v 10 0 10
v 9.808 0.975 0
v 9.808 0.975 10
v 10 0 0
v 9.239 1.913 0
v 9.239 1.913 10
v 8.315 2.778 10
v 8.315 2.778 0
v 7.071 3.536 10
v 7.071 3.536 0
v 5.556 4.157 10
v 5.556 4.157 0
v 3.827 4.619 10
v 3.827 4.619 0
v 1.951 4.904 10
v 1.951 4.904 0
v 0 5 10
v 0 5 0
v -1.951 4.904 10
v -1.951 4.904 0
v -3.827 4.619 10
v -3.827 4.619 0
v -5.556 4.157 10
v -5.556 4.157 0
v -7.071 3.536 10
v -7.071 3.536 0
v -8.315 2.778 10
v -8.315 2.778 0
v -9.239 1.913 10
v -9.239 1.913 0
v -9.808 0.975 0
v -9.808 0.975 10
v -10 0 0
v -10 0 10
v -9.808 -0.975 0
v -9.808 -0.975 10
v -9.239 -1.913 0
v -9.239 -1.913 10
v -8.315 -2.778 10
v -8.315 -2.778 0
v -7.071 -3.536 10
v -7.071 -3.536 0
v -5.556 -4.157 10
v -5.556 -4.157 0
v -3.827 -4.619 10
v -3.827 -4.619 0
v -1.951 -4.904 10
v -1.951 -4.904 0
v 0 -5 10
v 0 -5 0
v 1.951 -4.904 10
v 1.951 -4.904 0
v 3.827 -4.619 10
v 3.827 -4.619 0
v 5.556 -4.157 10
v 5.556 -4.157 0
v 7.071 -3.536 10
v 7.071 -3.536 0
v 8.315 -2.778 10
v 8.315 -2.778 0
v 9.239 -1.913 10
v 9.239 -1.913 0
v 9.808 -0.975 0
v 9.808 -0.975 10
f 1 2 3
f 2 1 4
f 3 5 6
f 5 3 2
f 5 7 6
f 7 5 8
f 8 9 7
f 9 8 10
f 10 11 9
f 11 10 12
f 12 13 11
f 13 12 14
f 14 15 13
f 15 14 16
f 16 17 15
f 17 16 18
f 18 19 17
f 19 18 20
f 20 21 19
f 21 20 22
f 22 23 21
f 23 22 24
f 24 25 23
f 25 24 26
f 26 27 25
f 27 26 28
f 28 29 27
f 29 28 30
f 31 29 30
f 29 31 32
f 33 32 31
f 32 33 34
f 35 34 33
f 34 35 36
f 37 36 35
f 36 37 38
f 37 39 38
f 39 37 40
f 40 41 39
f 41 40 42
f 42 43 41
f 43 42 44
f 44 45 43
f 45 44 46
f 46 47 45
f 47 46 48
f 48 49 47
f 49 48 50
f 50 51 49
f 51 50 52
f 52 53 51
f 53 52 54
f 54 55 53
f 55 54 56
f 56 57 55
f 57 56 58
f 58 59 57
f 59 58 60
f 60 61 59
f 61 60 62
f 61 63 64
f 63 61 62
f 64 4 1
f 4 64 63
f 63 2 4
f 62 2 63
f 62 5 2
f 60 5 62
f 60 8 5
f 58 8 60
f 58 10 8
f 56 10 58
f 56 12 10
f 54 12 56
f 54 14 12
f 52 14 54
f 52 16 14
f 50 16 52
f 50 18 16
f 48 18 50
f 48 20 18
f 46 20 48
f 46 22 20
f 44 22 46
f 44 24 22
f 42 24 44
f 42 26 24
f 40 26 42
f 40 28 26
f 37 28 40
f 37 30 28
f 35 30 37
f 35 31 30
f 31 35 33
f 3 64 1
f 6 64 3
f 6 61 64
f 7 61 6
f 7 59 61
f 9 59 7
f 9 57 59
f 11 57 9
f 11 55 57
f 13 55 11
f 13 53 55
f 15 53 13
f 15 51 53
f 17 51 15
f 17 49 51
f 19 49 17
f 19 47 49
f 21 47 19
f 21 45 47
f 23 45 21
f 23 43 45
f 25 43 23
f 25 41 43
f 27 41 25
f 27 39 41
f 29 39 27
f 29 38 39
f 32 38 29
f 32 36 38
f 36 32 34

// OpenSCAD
// A cylinder under an uneven scale: an elliptic cylinder, declared and written.
//
// A circular cylinder under any affine map that is not a similarity is the
// elliptic cylinder through the image of its circle - the images of its axis and
// of two perpendicular radii are the sweep and two conjugate semi-diameters of a
// section. Until 2026-09-25 the record was dropped instead (Surface::transform
// had nothing to become), and so were the planes of both caps, though a plane
// stays a plane under every affine map. Now the cylinder becomes an
// EllipticCylinderSurface (Surface::transformed), the planes move with the map,
// and the wall is written as the SURFACE_OF_LINEAR_EXTRUSION of its ELLIPSE.
//
// Declared, from the model: the elliptic cylinder of semi-axes 10 and 5, and the
// two cap planes.
// EXPECT: 1 analytic surface available (0 cylindrical, 0 spherical, 0 toroidal, 0 Bezier, 1 elliptic), and 2 declared planes
//
// Every wall facet is on it at machine precision - the scale moves each vertex
// onto the image of the circle it was on - so every one is decided by the model.
// EXPECT: what decided each written facet: 32 D0, 0 D1, 0 D2, 0 D3, 0 D4
// And the rims are the planes' sections of it, ellipses, written as such - each
// on the plane its cap facets are named for, not one their corners happen to
// lie on (open item 39, R13).
// EXPECT: on a plane the model declared (2 named for it, 0 on it by position alone, which derives the plane - D1), 0 on one taken from the mesh
//
// And the wall is one face. It goes all the way round between its two rims, so
// it is closed by a seam along a ruling, as a band is, and each rim is one whole
// ELLIPSE from the seam back to it - two plane sections, and the one seam line.
// EXPECT: 2 plane sections written as the conic it is - 2 on a plane the model declared
// EXPECT: 1 face round its axis between two rims closed by a seam along a ruling
// ROUNDTRIP: Plane=2 SurfaceOfExtrusion=1
// EDGES: Ellipse=2 Line=1
//
// Derived: pi a b h = pi * 10 * 5 * 10.
// VOLUME: 1570.7963268
$fn = 32;
scale([2, 1, 1]) cylinder(r = 5, h = 10);
